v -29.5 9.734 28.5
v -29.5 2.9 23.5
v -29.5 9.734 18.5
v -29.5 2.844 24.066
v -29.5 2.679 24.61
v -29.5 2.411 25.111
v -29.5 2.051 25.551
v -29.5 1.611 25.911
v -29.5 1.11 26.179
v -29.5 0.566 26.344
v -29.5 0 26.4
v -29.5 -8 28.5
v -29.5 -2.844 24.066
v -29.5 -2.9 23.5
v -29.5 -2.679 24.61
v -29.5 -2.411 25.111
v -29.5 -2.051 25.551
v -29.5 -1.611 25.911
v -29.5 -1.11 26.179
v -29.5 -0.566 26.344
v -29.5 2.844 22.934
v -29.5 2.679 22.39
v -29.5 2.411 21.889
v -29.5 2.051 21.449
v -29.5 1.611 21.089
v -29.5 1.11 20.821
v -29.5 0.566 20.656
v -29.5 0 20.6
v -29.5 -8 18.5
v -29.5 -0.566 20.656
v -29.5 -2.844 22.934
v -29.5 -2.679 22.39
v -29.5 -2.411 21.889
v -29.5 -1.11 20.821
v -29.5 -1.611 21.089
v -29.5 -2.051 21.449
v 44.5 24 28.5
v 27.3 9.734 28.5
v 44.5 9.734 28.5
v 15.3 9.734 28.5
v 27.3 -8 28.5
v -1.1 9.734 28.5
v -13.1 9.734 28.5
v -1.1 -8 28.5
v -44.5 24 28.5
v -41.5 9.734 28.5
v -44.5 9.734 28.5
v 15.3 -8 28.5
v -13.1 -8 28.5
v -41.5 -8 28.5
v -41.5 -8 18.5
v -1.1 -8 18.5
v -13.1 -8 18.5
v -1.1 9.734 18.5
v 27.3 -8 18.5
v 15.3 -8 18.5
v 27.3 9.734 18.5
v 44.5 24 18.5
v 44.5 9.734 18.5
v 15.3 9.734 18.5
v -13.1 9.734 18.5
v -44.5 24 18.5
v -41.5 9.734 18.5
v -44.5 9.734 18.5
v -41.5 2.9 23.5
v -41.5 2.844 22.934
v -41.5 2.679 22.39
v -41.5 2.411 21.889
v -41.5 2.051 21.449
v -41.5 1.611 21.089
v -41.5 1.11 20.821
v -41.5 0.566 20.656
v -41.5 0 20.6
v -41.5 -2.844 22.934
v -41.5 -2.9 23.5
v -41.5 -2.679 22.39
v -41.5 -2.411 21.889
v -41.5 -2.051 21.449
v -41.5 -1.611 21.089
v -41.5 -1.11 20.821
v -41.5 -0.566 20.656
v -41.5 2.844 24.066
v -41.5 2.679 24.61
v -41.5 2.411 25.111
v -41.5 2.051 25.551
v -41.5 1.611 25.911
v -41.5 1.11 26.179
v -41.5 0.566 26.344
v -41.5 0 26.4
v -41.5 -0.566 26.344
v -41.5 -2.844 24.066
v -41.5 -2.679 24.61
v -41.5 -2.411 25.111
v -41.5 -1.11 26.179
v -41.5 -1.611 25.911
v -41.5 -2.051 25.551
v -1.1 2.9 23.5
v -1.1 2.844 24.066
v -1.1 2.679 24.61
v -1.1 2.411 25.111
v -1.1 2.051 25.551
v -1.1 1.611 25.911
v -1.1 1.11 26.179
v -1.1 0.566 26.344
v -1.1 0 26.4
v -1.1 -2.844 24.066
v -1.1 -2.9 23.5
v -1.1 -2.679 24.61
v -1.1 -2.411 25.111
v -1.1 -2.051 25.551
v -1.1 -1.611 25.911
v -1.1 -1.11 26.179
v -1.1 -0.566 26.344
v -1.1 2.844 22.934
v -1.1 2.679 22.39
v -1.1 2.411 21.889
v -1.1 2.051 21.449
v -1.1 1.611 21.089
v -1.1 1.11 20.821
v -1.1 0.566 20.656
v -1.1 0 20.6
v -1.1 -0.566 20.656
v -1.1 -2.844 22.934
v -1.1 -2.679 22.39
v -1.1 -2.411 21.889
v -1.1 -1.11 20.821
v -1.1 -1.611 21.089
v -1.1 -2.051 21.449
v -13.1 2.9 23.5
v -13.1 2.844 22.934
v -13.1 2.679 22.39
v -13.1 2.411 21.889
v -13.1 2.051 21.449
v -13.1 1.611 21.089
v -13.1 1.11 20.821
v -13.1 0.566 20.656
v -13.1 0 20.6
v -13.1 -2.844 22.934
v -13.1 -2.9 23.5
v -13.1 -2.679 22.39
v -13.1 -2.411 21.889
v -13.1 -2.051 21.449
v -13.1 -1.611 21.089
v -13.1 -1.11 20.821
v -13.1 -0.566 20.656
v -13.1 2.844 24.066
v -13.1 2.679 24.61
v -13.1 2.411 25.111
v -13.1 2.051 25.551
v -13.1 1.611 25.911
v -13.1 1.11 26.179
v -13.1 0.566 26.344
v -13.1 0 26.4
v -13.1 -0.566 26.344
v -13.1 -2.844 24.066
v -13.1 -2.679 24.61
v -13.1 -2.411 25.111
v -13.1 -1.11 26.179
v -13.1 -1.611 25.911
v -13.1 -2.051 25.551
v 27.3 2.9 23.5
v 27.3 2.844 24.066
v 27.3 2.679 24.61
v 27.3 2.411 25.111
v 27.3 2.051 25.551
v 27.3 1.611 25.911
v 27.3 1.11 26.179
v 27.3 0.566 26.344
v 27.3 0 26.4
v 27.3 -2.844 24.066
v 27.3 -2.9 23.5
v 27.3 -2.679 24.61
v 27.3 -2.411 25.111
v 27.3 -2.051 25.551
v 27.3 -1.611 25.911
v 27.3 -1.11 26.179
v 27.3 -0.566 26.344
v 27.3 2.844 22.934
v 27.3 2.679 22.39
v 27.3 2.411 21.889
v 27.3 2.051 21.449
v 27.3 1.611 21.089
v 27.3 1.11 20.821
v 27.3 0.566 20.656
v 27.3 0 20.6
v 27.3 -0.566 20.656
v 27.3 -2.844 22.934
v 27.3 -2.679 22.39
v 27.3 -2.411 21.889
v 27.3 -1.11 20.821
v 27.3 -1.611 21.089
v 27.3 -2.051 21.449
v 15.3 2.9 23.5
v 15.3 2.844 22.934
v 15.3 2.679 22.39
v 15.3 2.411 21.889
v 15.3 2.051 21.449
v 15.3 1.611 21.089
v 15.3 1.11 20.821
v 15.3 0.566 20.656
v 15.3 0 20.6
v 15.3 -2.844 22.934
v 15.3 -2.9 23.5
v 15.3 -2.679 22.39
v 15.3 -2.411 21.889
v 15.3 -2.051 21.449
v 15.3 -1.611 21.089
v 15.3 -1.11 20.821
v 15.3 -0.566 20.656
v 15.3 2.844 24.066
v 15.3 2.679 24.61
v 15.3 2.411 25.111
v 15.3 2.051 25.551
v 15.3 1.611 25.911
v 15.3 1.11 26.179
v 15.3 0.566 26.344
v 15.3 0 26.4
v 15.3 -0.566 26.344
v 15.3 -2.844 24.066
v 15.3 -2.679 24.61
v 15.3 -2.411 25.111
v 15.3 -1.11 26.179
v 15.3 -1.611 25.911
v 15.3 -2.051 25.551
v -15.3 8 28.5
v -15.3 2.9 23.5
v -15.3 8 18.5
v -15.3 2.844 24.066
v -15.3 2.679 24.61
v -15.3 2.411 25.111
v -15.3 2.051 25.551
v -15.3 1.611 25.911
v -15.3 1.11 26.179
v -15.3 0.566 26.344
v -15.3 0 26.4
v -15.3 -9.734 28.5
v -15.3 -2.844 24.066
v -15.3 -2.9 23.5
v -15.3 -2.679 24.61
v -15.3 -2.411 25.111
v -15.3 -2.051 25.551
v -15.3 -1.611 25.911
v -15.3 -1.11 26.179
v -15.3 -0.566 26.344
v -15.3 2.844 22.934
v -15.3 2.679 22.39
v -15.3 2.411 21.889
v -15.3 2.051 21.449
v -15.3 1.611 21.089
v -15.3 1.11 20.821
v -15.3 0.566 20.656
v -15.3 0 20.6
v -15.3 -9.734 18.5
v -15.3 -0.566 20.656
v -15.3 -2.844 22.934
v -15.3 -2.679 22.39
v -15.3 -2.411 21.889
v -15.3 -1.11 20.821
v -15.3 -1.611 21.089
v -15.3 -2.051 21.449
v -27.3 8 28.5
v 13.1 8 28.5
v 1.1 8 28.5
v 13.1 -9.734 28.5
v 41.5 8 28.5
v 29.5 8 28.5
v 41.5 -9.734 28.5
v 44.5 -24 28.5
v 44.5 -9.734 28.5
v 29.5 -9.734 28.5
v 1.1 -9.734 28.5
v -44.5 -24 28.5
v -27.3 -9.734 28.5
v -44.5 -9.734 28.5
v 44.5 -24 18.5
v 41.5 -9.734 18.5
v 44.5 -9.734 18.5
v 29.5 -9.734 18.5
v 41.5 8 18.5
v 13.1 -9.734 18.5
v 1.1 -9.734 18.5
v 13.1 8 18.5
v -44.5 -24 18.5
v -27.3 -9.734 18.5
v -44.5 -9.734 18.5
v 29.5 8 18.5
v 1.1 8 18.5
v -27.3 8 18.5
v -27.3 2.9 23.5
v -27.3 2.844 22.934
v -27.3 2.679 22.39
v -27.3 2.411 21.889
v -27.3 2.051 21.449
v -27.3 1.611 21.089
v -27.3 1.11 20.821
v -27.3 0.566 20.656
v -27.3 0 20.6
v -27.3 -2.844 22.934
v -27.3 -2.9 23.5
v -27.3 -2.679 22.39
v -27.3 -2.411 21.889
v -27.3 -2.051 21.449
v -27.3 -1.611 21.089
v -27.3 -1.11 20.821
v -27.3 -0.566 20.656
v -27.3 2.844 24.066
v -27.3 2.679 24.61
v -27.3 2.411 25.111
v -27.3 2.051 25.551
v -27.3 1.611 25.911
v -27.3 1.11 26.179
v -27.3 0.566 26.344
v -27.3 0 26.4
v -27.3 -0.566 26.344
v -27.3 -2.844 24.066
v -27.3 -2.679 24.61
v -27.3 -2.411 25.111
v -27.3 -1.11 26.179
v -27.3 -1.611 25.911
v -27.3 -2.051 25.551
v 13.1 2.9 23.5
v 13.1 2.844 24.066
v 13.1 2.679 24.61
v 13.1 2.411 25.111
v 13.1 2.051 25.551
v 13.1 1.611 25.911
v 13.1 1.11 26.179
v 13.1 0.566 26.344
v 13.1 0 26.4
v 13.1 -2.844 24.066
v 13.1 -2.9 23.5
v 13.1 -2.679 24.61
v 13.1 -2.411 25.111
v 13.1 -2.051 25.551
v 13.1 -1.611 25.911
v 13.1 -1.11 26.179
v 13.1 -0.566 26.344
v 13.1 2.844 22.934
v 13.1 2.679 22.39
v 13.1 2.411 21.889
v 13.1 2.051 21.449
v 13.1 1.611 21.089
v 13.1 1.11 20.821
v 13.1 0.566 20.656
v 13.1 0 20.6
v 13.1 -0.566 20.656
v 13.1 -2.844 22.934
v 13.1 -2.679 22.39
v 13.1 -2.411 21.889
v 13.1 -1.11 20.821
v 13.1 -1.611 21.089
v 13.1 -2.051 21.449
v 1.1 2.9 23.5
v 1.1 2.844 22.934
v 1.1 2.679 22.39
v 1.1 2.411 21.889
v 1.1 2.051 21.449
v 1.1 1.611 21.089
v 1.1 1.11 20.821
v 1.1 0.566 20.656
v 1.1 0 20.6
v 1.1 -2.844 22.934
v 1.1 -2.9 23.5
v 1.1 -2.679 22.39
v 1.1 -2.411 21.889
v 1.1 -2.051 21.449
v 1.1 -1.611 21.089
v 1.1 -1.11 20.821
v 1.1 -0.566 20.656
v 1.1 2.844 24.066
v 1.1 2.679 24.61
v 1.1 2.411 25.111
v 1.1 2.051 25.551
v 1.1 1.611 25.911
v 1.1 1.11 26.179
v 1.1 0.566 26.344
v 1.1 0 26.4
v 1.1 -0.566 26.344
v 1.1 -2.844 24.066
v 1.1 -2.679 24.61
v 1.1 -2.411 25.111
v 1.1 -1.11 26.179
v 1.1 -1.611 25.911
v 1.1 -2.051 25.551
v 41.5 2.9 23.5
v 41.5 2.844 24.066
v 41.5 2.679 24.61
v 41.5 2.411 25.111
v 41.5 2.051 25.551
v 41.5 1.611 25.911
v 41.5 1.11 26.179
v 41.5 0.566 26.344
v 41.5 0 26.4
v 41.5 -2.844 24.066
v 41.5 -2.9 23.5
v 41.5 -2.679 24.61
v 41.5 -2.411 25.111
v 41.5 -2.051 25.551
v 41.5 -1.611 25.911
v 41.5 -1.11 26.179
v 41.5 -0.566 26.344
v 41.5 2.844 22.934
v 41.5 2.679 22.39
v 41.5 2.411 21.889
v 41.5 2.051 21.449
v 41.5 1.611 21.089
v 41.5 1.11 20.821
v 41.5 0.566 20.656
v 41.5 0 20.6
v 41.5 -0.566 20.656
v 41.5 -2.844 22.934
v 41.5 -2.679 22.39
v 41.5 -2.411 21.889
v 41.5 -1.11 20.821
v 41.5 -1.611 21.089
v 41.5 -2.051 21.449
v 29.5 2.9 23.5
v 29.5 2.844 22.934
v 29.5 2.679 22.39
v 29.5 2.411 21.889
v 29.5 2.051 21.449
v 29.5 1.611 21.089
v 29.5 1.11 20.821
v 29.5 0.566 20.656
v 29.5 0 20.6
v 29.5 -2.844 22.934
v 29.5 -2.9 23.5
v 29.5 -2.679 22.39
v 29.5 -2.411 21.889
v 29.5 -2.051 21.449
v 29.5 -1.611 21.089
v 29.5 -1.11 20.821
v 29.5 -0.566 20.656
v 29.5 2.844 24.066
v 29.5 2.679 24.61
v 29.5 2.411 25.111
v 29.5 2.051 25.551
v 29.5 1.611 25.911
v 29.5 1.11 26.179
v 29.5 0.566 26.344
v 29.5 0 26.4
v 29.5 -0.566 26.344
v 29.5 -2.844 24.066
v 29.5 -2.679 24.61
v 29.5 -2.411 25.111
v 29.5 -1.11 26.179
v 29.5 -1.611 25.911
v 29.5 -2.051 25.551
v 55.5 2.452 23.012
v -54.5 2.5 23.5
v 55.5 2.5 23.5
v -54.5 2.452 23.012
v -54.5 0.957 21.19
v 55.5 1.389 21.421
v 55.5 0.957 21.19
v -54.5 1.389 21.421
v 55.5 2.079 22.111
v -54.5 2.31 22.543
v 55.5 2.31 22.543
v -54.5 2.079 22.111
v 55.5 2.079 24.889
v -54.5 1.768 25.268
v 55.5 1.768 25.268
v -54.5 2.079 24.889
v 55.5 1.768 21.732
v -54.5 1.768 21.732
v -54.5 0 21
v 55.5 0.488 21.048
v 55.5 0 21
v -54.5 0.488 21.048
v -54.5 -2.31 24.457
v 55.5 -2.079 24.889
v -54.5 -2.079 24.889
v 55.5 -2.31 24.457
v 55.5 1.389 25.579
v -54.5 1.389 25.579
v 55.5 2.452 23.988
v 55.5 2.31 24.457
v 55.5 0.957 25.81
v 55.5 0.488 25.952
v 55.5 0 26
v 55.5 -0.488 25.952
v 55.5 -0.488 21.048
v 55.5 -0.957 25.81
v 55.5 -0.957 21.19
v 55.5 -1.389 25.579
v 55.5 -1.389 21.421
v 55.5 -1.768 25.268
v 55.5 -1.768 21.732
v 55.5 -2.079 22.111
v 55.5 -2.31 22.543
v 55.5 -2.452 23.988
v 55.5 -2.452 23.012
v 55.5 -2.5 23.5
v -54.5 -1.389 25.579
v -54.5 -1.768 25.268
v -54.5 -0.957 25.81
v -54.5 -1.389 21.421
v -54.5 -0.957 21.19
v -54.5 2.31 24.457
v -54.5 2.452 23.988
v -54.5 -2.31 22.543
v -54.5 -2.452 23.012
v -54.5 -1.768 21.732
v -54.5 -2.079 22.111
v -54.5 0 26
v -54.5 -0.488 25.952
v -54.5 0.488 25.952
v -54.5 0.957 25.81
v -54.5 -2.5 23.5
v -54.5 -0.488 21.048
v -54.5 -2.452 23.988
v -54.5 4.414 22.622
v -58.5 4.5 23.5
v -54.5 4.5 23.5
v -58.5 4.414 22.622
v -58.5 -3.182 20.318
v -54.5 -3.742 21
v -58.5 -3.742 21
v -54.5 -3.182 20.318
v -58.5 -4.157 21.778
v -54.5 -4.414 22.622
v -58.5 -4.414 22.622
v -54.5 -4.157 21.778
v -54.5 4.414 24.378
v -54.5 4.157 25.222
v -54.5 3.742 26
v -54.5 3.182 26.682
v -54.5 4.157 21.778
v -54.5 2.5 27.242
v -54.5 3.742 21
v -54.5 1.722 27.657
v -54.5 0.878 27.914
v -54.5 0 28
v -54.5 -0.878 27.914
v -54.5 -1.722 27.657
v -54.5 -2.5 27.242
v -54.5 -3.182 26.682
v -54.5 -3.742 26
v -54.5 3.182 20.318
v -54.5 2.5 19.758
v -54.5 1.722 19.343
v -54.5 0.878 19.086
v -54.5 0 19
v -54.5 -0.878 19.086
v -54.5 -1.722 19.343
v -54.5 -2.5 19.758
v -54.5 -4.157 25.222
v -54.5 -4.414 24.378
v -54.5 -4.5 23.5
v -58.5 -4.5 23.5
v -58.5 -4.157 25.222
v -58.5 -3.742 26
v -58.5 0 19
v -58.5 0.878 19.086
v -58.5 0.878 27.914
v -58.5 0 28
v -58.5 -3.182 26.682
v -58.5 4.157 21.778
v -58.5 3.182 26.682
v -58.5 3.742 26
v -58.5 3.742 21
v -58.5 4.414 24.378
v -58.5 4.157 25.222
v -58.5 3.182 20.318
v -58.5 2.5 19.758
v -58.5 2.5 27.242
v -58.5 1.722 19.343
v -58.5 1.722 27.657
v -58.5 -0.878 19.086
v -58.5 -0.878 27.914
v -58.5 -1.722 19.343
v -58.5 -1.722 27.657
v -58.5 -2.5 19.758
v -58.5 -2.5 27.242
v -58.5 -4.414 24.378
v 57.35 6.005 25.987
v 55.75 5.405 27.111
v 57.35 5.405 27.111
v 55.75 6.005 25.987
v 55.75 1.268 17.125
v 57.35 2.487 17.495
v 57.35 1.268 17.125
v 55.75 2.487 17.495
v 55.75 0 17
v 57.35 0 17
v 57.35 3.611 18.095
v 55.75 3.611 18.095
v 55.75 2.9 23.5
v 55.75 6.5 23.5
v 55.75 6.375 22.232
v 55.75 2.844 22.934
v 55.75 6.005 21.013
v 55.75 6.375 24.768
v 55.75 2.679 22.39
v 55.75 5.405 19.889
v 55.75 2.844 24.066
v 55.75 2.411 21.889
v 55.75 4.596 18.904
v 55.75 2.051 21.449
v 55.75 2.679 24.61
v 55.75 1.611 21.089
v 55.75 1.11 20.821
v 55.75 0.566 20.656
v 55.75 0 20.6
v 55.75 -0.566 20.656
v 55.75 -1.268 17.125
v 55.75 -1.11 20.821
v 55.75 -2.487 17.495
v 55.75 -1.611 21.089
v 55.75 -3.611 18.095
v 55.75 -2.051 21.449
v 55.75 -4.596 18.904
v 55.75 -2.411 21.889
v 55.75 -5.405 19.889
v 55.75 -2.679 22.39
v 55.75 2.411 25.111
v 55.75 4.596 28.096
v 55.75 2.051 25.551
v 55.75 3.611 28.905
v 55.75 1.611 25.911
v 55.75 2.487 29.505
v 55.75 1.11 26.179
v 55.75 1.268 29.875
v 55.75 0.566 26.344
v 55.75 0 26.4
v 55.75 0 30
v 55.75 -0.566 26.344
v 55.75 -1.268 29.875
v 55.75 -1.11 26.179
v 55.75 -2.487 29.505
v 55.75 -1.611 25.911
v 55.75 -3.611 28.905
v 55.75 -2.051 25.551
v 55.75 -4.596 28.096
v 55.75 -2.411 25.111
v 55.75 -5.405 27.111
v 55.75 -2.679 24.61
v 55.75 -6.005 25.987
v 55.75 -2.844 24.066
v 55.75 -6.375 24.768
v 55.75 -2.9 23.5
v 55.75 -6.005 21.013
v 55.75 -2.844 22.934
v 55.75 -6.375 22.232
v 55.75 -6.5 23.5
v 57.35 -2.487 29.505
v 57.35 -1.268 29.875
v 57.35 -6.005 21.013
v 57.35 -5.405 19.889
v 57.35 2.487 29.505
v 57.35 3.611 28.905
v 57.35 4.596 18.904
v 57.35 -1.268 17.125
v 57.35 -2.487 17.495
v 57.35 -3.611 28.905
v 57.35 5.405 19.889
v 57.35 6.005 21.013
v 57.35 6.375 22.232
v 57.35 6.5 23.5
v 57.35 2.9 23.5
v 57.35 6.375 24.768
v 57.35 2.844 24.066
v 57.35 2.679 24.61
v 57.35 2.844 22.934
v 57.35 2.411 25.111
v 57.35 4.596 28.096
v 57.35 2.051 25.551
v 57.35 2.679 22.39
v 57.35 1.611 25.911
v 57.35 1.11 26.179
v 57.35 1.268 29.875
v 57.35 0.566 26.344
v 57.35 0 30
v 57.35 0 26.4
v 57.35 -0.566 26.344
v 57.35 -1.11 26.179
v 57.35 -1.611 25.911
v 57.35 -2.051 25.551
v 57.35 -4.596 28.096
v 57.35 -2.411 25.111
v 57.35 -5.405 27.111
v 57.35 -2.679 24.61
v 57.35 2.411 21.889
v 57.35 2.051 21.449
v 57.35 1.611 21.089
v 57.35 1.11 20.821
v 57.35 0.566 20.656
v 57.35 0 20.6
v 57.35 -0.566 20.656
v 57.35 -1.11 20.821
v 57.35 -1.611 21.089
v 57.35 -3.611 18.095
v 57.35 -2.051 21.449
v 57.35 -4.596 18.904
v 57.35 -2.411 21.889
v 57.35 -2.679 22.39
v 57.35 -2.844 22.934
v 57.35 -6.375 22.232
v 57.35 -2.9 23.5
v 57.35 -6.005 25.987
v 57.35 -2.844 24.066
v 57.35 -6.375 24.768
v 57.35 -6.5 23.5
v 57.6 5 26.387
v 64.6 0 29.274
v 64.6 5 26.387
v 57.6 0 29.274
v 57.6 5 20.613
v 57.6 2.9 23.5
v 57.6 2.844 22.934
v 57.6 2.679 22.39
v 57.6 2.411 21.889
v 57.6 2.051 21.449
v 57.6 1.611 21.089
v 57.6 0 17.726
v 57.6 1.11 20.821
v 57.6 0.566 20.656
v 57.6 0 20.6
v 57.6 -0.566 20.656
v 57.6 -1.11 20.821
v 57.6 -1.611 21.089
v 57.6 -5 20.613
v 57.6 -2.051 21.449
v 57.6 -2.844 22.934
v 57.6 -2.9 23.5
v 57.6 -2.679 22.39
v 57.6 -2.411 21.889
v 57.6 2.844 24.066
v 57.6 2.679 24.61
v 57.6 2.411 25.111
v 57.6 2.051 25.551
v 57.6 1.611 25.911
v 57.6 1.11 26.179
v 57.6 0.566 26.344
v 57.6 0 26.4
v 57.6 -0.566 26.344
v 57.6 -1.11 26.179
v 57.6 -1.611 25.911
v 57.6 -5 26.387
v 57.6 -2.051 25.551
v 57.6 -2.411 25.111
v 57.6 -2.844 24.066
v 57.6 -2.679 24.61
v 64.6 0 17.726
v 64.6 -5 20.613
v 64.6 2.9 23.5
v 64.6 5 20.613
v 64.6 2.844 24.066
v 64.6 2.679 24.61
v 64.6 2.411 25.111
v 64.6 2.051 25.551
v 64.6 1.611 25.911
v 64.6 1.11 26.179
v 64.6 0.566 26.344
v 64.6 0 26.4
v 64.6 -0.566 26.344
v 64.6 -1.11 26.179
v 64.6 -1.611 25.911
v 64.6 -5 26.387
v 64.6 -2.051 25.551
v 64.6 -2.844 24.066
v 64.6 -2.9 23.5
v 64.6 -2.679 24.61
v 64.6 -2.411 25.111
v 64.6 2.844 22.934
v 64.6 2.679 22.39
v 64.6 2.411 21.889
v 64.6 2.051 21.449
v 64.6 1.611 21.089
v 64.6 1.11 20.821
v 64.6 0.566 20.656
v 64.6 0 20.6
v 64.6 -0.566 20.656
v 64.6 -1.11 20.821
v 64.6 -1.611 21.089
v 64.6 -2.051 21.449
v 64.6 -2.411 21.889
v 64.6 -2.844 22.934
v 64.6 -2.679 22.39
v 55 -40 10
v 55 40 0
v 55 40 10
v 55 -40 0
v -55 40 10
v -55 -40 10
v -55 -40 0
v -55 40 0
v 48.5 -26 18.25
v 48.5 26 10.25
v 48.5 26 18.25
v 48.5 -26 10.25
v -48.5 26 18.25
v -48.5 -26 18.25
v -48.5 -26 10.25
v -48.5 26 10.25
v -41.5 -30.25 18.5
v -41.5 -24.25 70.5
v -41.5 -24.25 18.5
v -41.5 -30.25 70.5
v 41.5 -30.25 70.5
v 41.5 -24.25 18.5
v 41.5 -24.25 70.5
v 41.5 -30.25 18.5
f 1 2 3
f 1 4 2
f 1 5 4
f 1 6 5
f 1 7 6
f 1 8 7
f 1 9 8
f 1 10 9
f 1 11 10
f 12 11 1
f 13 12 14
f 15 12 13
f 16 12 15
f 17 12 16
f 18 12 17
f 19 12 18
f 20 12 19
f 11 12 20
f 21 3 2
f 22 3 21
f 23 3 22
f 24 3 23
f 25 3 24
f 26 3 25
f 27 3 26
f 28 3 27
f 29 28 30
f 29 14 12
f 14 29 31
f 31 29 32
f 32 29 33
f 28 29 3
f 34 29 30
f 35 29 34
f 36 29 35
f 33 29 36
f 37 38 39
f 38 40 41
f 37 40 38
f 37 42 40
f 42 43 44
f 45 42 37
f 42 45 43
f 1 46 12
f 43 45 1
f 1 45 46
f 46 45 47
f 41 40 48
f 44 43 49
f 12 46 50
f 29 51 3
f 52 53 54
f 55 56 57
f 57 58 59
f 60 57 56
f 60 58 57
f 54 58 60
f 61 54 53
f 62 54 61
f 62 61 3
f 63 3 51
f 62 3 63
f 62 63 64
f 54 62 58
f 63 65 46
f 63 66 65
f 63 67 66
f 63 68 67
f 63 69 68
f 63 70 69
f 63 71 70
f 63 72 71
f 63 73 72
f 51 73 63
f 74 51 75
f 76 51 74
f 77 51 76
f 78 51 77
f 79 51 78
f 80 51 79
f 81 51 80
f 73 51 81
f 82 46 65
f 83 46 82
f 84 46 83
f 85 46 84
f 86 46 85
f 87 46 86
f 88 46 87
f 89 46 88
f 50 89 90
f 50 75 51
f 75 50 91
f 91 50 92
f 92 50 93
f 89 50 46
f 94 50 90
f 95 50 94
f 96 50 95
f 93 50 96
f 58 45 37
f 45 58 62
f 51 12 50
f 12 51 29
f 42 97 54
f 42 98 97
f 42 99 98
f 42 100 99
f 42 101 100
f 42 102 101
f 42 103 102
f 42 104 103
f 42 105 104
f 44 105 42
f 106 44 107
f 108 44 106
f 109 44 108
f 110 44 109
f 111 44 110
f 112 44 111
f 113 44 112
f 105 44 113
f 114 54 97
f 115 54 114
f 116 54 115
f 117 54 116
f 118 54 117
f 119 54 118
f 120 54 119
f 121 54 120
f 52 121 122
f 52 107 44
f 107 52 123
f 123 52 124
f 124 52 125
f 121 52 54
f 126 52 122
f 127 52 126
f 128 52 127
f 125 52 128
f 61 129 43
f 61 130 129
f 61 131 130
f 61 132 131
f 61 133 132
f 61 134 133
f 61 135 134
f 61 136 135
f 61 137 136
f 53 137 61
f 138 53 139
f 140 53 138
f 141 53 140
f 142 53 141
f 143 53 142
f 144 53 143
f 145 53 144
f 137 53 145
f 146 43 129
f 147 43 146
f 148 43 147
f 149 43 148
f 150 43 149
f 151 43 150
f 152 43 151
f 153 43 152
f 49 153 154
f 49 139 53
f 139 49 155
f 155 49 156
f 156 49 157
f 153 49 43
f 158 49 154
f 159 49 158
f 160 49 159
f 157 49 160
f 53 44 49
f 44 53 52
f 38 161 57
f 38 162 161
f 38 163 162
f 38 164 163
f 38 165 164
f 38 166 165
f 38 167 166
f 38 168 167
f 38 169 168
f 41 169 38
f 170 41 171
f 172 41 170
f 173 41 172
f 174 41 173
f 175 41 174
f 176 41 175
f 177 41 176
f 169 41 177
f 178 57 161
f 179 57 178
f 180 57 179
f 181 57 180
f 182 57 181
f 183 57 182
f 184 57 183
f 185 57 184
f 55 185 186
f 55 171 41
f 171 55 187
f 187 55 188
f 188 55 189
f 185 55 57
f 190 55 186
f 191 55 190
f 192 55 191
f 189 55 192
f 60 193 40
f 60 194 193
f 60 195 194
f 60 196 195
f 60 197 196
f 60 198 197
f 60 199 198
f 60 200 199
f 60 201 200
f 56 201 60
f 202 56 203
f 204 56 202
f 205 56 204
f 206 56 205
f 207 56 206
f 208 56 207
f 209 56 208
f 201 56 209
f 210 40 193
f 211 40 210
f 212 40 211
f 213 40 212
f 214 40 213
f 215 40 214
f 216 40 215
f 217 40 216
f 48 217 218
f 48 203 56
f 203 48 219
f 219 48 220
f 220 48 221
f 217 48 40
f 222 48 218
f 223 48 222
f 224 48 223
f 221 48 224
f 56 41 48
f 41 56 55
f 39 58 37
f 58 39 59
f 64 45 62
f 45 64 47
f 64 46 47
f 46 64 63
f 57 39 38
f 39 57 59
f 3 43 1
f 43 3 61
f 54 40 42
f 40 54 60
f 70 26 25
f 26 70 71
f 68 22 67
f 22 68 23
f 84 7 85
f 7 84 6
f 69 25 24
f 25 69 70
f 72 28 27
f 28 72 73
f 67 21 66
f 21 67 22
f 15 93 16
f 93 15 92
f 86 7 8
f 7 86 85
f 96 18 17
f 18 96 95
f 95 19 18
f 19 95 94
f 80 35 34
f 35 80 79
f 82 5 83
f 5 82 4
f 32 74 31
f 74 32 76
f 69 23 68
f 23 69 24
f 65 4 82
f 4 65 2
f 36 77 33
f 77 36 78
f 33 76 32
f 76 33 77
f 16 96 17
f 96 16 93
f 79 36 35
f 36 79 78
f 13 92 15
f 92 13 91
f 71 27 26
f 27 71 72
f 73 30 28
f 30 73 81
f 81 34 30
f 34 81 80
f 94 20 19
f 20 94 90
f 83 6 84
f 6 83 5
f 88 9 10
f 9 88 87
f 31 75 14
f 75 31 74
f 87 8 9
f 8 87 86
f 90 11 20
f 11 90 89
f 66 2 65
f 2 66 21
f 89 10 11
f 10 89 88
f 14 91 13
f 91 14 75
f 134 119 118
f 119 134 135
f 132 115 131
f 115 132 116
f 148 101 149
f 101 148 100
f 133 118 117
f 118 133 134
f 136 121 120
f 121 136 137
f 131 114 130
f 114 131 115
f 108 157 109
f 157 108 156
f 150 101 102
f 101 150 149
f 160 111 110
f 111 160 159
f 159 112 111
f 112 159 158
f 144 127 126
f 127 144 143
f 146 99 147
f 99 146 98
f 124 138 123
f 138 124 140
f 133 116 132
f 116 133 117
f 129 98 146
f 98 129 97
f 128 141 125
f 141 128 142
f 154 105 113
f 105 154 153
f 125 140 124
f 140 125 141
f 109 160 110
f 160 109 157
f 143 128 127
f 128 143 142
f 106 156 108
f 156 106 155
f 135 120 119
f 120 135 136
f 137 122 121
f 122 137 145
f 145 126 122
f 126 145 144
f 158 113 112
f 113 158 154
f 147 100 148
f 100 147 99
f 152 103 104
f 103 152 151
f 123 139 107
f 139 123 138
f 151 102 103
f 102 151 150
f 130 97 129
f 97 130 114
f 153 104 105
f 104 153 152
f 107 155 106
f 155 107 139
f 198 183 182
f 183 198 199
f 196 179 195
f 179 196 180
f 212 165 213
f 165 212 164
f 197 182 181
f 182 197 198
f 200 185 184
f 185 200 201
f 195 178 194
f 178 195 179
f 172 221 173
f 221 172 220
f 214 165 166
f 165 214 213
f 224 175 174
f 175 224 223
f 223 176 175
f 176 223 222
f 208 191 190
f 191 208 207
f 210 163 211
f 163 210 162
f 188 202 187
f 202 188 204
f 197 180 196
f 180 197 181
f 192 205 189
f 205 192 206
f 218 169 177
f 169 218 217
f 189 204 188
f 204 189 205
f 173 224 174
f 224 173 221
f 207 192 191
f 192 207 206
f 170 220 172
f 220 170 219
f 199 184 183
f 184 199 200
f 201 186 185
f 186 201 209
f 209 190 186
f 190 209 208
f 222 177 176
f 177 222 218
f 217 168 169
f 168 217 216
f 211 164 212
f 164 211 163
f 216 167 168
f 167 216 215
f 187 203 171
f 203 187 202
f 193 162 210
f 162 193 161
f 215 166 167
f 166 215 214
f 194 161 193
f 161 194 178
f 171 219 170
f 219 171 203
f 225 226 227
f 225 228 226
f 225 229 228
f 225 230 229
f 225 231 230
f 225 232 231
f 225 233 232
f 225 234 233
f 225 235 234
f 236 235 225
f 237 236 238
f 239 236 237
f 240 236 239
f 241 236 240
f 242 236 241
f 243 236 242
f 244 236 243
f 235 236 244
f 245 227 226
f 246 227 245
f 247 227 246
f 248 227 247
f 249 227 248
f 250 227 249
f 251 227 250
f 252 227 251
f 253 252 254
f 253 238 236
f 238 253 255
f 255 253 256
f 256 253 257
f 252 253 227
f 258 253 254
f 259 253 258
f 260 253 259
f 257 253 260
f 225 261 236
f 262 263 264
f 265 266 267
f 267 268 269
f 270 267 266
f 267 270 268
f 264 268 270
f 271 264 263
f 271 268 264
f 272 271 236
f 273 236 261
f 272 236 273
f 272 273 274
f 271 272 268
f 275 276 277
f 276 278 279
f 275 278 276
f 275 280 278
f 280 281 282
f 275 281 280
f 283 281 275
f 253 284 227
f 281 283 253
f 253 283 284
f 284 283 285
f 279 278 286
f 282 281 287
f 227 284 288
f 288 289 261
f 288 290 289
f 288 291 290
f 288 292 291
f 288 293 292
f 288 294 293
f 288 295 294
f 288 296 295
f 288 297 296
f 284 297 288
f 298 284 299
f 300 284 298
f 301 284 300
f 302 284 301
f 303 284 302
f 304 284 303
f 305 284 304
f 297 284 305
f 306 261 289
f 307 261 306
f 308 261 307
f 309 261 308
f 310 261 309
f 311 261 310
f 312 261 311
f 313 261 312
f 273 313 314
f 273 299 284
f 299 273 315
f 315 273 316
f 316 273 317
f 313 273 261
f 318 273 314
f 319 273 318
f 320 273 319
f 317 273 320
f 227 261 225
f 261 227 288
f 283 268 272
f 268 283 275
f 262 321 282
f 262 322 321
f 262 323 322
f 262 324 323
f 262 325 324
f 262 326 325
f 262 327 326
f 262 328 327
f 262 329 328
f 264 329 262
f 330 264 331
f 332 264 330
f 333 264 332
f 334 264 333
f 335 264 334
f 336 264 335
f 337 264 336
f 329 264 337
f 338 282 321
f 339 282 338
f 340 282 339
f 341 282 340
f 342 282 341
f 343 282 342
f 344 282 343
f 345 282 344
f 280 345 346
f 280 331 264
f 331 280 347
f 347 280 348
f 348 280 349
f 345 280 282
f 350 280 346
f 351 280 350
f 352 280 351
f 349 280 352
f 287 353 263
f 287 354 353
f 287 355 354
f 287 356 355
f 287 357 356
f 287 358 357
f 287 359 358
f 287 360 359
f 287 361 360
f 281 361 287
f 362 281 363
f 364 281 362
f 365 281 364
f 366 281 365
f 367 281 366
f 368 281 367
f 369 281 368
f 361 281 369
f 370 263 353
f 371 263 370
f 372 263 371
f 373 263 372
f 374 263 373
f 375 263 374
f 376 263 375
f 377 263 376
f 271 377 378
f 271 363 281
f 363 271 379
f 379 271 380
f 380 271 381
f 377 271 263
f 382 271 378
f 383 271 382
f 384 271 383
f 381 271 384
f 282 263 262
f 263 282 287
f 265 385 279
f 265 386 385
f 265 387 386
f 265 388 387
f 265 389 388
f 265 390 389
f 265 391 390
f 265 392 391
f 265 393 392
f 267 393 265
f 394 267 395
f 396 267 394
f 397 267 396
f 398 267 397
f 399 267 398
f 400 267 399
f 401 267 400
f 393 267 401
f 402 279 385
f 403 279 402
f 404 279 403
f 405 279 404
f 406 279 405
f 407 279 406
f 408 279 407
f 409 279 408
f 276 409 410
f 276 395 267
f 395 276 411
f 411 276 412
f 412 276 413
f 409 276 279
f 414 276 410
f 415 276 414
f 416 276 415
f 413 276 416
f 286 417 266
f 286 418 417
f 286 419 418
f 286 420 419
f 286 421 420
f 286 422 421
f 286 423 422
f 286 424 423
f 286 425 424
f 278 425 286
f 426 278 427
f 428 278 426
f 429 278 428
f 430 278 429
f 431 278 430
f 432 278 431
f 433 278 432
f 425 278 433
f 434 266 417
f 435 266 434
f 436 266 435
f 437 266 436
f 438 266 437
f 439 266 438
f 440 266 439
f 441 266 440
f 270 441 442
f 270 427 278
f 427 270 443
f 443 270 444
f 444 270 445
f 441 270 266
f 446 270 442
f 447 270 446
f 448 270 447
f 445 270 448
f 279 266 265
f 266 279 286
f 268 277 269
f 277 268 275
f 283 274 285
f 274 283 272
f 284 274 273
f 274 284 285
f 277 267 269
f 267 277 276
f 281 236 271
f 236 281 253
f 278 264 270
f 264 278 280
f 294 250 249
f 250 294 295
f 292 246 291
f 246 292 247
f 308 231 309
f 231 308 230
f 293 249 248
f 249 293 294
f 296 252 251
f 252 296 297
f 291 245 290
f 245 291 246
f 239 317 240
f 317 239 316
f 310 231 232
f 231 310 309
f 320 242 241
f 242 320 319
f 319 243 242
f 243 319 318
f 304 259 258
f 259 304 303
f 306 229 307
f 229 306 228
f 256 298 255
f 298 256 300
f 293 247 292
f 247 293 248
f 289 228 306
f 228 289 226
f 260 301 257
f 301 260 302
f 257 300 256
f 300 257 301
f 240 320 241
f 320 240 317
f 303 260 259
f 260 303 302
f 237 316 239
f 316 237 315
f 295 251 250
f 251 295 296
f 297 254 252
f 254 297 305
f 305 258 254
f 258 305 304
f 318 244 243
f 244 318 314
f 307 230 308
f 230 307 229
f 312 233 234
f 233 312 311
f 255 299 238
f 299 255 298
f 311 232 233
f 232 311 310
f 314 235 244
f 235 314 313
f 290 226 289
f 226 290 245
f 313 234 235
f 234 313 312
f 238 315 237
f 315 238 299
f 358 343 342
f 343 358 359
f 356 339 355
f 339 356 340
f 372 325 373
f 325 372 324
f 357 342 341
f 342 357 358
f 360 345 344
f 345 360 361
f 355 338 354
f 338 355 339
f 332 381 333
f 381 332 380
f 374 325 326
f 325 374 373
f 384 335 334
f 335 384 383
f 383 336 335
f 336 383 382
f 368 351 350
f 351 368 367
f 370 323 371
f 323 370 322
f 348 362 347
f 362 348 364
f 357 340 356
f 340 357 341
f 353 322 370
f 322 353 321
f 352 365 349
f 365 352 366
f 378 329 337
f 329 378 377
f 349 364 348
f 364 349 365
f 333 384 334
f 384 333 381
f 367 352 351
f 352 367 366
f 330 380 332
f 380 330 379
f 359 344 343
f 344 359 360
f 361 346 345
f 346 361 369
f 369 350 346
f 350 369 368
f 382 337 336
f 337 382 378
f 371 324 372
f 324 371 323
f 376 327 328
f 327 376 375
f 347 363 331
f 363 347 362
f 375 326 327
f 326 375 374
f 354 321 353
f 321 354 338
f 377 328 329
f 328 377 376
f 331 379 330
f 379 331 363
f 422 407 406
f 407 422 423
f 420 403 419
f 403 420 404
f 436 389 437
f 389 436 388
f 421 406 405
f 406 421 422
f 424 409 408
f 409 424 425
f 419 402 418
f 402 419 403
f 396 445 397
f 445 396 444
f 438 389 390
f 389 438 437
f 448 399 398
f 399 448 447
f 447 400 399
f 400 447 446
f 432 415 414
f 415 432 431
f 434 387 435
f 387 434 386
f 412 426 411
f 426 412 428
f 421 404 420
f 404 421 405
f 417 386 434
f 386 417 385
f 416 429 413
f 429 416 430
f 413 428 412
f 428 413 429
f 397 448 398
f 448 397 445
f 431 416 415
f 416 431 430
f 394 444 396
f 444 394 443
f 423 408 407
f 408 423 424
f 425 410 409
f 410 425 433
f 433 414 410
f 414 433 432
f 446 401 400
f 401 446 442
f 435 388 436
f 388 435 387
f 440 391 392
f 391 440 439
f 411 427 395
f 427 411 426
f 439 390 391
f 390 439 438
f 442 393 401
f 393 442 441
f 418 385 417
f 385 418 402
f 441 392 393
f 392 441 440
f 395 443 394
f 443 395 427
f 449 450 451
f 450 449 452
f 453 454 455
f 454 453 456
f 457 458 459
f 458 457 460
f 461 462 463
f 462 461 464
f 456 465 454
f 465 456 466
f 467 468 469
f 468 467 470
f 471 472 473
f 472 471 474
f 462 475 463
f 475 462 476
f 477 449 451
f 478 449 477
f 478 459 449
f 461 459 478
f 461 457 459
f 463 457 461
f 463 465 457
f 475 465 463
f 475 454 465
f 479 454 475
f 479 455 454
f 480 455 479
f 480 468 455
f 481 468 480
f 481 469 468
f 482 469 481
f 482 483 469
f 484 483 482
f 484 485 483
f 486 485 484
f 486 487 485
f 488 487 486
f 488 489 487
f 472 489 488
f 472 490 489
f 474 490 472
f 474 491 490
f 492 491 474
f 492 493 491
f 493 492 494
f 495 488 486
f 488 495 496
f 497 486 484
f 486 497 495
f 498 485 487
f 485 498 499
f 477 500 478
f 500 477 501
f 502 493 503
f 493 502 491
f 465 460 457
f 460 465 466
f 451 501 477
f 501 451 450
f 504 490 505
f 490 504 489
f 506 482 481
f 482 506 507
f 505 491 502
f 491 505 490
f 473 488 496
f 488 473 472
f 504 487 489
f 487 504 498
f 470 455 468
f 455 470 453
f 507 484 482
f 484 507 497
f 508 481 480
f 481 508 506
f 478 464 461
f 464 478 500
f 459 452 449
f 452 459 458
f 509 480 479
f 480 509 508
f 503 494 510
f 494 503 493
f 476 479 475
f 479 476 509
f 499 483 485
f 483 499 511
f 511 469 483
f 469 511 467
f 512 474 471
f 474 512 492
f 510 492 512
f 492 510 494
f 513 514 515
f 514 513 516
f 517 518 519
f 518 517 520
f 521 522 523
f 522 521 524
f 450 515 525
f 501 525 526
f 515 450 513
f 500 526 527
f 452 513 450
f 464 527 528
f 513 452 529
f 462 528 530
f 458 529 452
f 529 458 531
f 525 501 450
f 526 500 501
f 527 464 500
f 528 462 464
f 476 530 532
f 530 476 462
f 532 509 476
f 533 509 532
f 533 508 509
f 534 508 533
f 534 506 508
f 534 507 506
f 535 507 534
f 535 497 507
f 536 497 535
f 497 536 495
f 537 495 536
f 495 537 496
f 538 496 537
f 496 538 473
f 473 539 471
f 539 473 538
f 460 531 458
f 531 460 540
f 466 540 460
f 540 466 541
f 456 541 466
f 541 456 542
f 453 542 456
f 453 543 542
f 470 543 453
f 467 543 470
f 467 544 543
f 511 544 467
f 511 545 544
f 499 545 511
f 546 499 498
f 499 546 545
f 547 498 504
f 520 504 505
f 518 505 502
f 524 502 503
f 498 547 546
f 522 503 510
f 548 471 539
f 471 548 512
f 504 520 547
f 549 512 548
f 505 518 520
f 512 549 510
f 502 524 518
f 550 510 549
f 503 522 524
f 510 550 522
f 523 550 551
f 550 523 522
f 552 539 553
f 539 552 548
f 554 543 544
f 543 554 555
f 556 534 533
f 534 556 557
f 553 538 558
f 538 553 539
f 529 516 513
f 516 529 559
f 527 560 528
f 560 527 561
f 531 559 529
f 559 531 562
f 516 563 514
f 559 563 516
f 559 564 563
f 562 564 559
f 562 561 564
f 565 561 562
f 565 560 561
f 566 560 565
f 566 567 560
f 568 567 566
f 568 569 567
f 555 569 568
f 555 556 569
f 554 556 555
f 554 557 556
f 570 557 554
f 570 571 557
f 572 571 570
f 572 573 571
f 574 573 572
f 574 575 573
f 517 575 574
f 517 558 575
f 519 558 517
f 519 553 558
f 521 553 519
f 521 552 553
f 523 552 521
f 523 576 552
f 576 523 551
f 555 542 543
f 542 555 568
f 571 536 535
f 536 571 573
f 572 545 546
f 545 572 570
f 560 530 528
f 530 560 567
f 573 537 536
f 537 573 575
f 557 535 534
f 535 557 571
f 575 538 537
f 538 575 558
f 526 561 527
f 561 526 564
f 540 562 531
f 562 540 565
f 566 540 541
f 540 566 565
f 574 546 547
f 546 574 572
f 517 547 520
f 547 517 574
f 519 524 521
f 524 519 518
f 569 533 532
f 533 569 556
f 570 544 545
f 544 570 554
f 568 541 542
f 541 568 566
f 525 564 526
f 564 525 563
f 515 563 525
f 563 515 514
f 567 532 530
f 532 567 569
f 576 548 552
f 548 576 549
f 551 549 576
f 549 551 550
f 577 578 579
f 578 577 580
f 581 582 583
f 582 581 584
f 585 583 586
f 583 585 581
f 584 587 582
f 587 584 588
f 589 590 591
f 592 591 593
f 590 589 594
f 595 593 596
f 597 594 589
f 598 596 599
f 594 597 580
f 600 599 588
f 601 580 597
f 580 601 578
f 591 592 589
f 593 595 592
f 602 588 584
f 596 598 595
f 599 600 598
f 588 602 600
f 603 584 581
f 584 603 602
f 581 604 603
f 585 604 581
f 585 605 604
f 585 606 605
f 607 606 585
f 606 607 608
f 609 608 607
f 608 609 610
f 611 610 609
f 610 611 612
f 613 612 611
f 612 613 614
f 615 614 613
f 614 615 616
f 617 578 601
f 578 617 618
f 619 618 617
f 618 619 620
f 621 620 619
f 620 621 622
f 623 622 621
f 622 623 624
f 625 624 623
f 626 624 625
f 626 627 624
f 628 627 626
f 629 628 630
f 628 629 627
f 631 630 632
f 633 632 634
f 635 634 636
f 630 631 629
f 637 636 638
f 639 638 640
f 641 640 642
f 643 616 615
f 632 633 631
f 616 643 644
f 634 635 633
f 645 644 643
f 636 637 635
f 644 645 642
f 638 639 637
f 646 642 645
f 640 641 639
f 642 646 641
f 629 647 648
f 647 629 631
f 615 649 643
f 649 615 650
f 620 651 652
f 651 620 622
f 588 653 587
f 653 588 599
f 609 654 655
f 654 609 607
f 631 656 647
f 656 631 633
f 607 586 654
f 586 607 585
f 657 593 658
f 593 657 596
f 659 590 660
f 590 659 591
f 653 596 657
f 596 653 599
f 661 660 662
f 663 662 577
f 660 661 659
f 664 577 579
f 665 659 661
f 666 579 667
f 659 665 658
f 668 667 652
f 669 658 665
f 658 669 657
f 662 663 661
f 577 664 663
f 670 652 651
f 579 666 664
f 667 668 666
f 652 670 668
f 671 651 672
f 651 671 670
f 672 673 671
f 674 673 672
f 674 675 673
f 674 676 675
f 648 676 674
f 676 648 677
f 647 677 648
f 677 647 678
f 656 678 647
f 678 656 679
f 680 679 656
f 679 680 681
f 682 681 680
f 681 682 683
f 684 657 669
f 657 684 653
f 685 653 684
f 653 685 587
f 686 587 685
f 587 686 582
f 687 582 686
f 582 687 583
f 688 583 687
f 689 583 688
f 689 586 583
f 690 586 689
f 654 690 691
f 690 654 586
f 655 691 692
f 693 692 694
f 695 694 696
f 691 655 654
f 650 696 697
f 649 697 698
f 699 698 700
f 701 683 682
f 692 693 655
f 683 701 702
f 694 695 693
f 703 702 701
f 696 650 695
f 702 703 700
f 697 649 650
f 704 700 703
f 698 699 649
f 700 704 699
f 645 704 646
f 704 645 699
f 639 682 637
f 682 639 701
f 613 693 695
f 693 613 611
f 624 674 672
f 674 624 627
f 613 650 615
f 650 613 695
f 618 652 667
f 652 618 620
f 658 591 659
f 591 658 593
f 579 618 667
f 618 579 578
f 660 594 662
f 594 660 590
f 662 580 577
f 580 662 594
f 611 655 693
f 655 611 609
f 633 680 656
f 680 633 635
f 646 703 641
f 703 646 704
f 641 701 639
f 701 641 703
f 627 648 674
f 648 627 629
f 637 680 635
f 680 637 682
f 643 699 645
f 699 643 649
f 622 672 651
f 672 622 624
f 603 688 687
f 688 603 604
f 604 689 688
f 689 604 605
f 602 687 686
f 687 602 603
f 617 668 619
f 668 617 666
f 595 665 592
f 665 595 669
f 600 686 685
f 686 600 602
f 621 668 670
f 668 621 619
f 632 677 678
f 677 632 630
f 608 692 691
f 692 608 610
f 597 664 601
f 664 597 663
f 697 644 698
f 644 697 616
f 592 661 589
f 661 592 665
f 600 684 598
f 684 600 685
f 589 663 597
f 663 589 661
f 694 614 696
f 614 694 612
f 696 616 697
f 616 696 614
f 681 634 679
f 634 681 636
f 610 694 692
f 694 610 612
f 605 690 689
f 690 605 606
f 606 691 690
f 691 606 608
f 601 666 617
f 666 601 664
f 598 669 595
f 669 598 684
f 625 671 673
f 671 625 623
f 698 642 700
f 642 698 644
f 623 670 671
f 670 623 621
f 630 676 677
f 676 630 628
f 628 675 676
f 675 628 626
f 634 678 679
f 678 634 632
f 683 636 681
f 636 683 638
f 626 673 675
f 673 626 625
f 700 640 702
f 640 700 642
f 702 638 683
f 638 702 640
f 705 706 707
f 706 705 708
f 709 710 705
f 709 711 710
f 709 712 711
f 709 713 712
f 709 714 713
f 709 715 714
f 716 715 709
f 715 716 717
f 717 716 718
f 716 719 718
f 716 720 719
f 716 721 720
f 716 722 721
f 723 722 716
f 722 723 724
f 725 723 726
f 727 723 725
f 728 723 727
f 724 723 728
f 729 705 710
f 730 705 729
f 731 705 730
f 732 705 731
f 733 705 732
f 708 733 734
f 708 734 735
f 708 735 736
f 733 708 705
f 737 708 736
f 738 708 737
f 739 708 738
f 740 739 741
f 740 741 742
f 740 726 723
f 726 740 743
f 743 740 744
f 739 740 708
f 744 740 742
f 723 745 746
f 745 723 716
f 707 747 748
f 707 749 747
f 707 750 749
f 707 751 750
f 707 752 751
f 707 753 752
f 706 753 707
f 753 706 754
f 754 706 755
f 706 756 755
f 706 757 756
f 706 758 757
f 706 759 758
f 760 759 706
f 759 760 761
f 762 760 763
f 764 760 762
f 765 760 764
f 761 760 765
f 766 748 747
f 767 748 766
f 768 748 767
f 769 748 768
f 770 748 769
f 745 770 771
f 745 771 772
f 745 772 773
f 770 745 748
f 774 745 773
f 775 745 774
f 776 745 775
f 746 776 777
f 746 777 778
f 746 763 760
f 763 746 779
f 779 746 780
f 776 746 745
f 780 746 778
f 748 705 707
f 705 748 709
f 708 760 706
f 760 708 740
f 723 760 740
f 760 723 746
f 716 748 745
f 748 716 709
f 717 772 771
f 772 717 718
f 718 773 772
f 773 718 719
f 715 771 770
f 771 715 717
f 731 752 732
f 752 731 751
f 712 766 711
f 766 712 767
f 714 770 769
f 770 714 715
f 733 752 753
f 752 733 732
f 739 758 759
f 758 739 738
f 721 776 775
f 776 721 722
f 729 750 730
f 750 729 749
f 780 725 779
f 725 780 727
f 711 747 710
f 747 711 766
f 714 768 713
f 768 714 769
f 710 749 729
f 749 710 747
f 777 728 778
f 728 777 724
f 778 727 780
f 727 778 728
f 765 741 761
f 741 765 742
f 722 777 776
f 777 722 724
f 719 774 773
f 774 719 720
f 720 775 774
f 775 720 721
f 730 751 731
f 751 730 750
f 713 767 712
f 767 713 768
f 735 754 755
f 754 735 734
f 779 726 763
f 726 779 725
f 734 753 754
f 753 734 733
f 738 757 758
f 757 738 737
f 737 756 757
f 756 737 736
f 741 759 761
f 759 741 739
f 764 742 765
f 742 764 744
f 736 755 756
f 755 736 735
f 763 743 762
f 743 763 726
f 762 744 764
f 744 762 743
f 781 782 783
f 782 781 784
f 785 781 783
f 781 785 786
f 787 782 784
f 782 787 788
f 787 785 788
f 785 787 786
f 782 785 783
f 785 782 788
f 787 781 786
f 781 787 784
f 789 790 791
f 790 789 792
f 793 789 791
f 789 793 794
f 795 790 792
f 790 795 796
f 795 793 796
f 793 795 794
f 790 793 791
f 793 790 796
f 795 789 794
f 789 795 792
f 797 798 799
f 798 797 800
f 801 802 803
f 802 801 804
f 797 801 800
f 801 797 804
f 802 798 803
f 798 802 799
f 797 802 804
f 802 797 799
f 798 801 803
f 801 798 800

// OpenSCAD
$fn = 32;

// ------------------------------------------------------------------------
// Comb hinge with flap: leaf 89 x 24 mm, pin d5, flap 52 mm
// Every part is its own module, assembly() places every instance.
// ------------------------------------------------------------------------

// --- part 1 ---
module hinge_bed() {
  difference() {
    translate([-55, -40, 0]) cube([110, 80, 10]);
  }
}

// --- part 2 ---
module hinge_riser() {
  difference() {
    translate([-48.5, -26, 0]) cube([97, 52, 8]);
  }
}

// --- part 3 ---
module hinge_leaf_a() {
  difference() {
    union() {
      translate([-41.5, -8, -5]) cube([12, 32, 10]);
      translate([-13.1, -8, -5]) cube([12, 32, 10]);
      translate([15.3, -8, -5]) cube([12, 32, 10]);
      translate([-44.5, 9.734, -5]) cube([89, 14.266, 10]);
    }
    translate([-35.5, 0, 0]) rotate([0, 90, 0]) cylinder(h = 14, d = 5.8, center = true);
    translate([-7.1, 0, 0]) rotate([0, 90, 0]) cylinder(h = 14, d = 5.8, center = true);
    translate([21.3, 0, 0]) rotate([0, 90, 0]) cylinder(h = 14, d = 5.8, center = true);
  }
}

// --- part 4 ---
module hinge_leaf_b() {
  difference() {
    union() {
      translate([-27.3, -24, -5]) cube([12, 32, 10]);
      translate([1.1, -24, -5]) cube([12, 32, 10]);
      translate([29.5, -24, -5]) cube([12, 32, 10]);
      translate([-44.5, -24, -5]) cube([89, 14.266, 10]);
    }
    translate([-21.3, 0, 0]) rotate([0, 90, 0]) cylinder(h = 14, d = 5.8, center = true);
    translate([7.1, 0, 0]) rotate([0, 90, 0]) cylinder(h = 14, d = 5.8, center = true);
    translate([35.5, 0, 0]) rotate([0, 90, 0]) cylinder(h = 14, d = 5.8, center = true);
  }
}

// --- part 5 ---
module hinge_flap() {
  difference() {
    translate([-41.5, -26, 0]) cube([83, 52, 6]);
  }
}

// --- part 6 ---
module hinge_pin() {
  rotate([0, 90, 0]) cylinder(h = 111, d = 5, center = true);
  translate([-58.5, 0, 0]) rotate([0, 90, 0]) cylinder(h = 4, d = 9);
}

// --- part 7 ---
module pin_washer() {
  difference() {
      translate([0, 0, 0]) cylinder(h = 1.6, d = 13);
      translate([0, 0, -1]) cylinder(h = 3.6, d = 5.8);
    }
}

// --- part 8 ---
module pin_nut() {
  difference() {
    linear_extrude(height = 7) polygon(points = [[5.774, 0], [2.887, 5], [-2.887, 5], [-5.774, 0], [-2.887, -5], [2.887, -5]]);
    translate([0, 0, -1]) cylinder(h = 9, d = 5.8);
  }
}

// --- assembly ---
module assembly() {
  color([0.80, 0.24, 0.20]) translate([0, 0, 0]) rotate([0, 0, 0]) hinge_bed();
  color([0.20, 0.45, 0.75]) translate([0, 0, 10.25]) rotate([0, 0, 0]) hinge_riser();
  color([0.25, 0.62, 0.32]) translate([0, 0, 23.5]) rotate([0, 0, 0]) hinge_leaf_a();
  color([0.92, 0.70, 0.18]) translate([0, 0, 23.5]) rotate([0, 0, 0]) hinge_leaf_b();
  color([0.58, 0.35, 0.70]) translate([0, -24.25, 44.5]) rotate([90, 0, 0]) hinge_flap();
  color([0.16, 0.66, 0.66]) translate([0, 0, 23.5]) rotate([0, 0, 0]) hinge_pin();
  color([0.85, 0.48, 0.18]) translate([55.75, 0, 23.5]) rotate([0, 90, 0]) pin_washer();
  color([0.55, 0.60, 0.65]) translate([57.6, 0, 23.5]) rotate([0, 90, 0]) pin_nut();
}

assembly();
